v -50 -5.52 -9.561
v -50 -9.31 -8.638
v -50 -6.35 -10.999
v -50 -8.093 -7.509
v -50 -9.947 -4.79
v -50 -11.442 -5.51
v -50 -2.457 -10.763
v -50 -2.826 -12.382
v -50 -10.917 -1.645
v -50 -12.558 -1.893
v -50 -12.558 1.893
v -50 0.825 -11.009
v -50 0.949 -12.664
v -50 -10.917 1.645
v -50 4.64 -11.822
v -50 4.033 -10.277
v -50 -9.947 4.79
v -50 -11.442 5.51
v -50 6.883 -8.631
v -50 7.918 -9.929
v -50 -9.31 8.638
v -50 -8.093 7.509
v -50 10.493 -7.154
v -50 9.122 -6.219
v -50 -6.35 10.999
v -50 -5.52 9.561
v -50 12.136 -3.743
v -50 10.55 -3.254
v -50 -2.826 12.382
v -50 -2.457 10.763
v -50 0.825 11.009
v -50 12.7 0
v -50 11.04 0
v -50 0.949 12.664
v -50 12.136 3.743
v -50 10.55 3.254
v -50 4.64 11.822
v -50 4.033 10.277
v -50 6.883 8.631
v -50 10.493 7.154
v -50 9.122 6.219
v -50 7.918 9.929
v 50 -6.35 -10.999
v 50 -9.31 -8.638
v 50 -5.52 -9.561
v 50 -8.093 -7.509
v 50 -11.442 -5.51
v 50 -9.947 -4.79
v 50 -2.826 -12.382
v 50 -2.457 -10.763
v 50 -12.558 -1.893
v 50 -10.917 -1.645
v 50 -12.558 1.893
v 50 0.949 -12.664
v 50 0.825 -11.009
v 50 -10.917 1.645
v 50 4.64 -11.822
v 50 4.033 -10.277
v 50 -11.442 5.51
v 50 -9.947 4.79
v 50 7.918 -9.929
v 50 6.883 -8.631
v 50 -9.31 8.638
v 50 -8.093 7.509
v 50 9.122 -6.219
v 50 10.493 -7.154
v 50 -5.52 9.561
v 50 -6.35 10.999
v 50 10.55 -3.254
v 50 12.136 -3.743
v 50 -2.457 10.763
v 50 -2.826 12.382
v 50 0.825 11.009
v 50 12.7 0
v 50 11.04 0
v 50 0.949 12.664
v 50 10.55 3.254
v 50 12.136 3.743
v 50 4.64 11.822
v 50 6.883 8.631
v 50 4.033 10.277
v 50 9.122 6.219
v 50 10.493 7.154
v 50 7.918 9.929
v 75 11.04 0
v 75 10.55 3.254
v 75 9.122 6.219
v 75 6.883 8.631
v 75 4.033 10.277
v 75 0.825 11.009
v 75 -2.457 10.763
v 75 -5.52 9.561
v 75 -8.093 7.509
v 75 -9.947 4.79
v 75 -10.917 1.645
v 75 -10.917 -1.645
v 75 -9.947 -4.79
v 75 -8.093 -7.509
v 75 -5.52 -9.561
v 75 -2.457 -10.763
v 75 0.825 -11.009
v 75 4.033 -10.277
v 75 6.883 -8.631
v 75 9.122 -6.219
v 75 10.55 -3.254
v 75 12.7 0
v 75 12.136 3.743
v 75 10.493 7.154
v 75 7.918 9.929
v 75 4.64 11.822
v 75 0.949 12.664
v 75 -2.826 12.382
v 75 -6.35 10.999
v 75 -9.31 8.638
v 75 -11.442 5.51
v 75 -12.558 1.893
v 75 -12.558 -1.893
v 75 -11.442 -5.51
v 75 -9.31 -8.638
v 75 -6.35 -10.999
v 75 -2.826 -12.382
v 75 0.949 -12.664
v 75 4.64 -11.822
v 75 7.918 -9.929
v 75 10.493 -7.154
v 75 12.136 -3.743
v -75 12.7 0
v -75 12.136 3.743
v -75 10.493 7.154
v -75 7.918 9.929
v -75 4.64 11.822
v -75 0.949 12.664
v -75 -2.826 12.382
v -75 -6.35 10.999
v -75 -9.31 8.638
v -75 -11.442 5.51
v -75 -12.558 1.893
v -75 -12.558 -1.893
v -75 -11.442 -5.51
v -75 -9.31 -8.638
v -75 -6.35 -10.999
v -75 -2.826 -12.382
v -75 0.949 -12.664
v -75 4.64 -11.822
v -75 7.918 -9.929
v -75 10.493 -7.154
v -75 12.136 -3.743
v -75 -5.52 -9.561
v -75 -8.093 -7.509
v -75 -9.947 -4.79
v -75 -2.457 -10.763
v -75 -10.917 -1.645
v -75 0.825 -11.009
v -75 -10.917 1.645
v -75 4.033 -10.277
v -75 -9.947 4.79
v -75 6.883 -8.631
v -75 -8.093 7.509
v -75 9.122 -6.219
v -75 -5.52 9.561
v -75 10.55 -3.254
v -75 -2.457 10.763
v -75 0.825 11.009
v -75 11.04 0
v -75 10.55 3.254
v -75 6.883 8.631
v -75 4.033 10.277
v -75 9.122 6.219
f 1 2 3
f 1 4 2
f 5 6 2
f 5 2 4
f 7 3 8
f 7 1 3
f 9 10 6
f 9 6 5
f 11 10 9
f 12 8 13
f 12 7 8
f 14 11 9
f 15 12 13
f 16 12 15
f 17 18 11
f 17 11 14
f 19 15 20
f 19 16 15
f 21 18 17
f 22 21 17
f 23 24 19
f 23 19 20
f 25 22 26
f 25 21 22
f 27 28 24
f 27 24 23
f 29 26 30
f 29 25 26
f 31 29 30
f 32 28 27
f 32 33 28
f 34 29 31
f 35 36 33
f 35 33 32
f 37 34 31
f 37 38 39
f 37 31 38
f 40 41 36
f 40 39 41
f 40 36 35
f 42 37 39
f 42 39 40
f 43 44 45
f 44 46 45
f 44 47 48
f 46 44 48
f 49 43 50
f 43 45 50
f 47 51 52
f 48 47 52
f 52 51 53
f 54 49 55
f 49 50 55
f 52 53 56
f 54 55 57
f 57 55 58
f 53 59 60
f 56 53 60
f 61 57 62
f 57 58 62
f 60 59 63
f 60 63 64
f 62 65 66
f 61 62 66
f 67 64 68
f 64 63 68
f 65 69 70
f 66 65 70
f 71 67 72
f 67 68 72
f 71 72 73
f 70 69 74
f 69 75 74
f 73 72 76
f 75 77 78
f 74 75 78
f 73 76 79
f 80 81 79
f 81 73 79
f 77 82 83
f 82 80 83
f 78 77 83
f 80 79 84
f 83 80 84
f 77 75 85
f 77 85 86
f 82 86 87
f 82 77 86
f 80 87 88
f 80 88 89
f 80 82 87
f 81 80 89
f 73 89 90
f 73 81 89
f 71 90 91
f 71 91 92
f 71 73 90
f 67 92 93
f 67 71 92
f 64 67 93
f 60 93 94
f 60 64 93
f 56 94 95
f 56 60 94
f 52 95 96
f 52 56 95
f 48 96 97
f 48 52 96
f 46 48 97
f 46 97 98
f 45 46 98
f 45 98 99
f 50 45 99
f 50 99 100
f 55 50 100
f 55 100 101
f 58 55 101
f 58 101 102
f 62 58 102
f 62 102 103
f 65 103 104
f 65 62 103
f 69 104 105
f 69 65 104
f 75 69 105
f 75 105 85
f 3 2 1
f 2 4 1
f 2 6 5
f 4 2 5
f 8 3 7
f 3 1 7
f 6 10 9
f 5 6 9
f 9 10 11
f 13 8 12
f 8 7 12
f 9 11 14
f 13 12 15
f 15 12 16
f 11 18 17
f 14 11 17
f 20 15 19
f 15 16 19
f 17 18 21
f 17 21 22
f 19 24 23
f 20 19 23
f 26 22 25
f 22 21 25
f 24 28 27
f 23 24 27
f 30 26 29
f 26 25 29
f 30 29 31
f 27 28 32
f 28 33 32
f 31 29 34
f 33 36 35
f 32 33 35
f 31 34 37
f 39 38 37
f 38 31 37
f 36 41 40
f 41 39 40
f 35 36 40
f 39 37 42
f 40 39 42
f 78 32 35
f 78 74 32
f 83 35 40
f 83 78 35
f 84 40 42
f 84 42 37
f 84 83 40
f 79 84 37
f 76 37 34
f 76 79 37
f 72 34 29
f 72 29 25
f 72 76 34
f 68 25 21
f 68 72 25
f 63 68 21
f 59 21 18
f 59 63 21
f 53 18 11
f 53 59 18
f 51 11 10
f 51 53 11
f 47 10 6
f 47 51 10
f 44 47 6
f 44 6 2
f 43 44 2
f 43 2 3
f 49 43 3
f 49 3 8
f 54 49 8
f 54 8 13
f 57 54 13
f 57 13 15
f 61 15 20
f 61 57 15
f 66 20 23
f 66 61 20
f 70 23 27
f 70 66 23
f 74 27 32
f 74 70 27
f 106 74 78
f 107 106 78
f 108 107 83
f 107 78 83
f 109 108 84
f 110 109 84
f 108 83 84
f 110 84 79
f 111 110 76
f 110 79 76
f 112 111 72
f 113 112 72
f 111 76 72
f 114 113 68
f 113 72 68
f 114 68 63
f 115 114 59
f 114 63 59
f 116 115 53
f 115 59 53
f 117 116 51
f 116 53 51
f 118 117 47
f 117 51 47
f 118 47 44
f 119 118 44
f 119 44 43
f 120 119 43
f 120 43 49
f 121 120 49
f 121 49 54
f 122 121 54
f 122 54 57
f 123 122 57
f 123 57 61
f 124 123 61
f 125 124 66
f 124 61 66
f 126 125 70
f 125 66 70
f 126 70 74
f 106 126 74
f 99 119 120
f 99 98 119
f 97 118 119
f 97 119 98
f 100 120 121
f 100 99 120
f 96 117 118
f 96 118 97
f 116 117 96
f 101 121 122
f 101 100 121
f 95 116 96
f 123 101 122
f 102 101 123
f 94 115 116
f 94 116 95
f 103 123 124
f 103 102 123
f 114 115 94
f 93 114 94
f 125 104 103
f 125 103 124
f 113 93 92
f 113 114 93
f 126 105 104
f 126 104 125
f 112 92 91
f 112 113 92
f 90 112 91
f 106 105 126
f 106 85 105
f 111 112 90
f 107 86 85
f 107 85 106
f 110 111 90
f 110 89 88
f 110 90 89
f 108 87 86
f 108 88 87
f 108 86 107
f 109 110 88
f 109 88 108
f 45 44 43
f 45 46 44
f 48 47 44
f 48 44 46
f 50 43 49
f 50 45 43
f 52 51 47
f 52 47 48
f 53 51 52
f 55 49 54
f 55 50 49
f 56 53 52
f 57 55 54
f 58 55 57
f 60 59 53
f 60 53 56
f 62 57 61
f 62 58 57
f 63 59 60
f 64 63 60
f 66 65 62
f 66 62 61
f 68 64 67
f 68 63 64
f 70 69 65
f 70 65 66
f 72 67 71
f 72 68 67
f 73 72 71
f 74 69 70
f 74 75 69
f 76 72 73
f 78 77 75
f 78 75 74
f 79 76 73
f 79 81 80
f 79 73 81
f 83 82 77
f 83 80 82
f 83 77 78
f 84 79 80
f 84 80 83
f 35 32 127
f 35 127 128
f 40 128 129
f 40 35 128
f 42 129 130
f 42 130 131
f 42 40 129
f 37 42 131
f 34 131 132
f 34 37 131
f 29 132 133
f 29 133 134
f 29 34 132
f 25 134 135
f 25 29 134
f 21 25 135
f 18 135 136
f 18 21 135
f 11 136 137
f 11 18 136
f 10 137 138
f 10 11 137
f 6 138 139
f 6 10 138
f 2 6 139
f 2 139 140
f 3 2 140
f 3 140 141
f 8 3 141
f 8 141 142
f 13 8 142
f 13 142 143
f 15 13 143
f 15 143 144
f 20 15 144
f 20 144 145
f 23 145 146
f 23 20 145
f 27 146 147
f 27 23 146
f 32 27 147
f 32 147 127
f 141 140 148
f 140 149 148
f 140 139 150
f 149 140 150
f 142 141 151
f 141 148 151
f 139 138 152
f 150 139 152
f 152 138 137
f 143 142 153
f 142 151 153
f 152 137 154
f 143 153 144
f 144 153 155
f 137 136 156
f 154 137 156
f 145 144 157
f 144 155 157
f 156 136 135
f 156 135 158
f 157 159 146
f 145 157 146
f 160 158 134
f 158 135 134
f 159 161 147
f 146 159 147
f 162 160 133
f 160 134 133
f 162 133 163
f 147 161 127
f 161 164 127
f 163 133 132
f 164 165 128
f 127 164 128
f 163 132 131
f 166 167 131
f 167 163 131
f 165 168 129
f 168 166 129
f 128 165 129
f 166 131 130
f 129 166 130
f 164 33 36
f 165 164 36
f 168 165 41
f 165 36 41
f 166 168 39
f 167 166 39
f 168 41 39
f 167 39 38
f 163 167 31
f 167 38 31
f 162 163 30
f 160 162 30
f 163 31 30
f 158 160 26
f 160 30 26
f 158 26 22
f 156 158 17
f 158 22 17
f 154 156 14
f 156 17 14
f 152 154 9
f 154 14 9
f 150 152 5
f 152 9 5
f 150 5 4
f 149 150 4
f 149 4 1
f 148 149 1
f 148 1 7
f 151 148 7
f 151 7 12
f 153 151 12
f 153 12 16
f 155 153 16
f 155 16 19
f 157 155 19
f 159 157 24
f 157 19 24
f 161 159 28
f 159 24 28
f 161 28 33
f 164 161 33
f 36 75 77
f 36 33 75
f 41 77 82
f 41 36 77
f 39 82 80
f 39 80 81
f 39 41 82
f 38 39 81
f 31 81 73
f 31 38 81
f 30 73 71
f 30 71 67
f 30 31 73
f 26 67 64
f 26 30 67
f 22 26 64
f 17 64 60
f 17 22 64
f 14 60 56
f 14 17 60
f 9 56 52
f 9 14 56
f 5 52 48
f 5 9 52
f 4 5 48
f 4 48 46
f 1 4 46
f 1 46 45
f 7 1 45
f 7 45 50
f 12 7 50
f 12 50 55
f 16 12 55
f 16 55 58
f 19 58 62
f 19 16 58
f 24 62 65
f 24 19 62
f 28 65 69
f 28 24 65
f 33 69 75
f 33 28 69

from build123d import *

# Parameters (mm, degrees)
F0_R        = 12.7
F0_R_2      = 11.04
F1_DEPTH    = 50
F1_FACE_R   = 12.7
F1_FACE_R_2 = 11.04
F2_DEPTH    = 25


with BuildPart() as f1:
    # F0 (on Right) → F1 (new body, symmetric)
    with BuildSketch(Plane.YZ):
        Circle(F0_R)
        Circle(F0_R_2, mode=Mode.SUBTRACT)
    extrude(amount=F1_DEPTH, both=True)


with BuildPart() as f2:
    # F1_face (on face) → F2 (new body)
    with BuildSketch(Plane.YZ.offset(50)):
        Circle(F1_FACE_R)
        Circle(F1_FACE_R_2, mode=Mode.SUBTRACT)
    extrude(amount=F2_DEPTH)


with BuildPart() as f3_1:
    # F3: instance of F2
    add(f2.part.mirror(Plane.YZ))


solid = Compound([f1.part, f2.part, f3_1.part])
